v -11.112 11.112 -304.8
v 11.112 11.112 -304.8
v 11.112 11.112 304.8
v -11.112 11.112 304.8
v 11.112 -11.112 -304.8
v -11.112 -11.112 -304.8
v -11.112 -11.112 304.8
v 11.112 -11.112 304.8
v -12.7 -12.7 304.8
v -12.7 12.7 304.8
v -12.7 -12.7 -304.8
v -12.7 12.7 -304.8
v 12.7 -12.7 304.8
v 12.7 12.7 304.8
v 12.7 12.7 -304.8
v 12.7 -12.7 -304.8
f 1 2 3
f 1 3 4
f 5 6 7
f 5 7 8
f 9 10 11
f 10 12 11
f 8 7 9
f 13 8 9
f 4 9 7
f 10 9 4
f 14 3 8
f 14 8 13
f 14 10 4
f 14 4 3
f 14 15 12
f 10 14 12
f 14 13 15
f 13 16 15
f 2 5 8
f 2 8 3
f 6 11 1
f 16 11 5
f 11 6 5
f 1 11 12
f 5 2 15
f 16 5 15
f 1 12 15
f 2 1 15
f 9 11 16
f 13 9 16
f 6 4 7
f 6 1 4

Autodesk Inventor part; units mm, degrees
ref_plane "YZ Plane" through (0, 0, 0) normal (1, 0, 0) x (0, 1, 0)
ref_plane "XZ Plane" through (0, 0, 0) normal (0, 1, 0) x (-1, 0, 0)
ref_plane "XY Plane" through (0, 0, 0) normal (0, 0, 1) x (1, 0, 0)
sketch "Sketch1" plane through (0, 0, 0) normal (0, 0, 1) x (1, 0, 0)
  line L0 (-12.7, -12.7) -> (12.7, -12.7)
  line L1 (12.7, -12.7) -> (12.7, 12.7)
  line L2 (12.7, 12.7) -> (-12.7, 12.7)
  line L3 (-12.7, 12.7) -> (-12.7, -12.7)
  line L4 (-12.7, -12.7) -> (12.7, 12.7) construction
  line L5 (12.7, -12.7) -> (-12.7, 12.7) construction
  line L6 (-11.1125, -11.1125) -> (11.1125, -11.1125)
  line L7 (11.1125, -11.1125) -> (11.1125, 11.1125)
  line L8 (11.1125, 11.1125) -> (-11.1125, 11.1125)
  line L9 (-11.1125, 11.1125) -> (-11.1125, -11.1125)
  line L10 (-11.1125, -11.1125) -> (11.1125, 11.1125) construction
  line L11 (11.1125, -11.1125) -> (-11.1125, 11.1125) construction
  point P0 (0, 0)
  dimension "d0" = 25.4
  dimension "d1" = 25.4
  dimension "d2" = 1.5875
extrude "Extrusion1" add sketch "Sketch1" along normal mid plane 609.6
properties part number "1in Box Tube"
